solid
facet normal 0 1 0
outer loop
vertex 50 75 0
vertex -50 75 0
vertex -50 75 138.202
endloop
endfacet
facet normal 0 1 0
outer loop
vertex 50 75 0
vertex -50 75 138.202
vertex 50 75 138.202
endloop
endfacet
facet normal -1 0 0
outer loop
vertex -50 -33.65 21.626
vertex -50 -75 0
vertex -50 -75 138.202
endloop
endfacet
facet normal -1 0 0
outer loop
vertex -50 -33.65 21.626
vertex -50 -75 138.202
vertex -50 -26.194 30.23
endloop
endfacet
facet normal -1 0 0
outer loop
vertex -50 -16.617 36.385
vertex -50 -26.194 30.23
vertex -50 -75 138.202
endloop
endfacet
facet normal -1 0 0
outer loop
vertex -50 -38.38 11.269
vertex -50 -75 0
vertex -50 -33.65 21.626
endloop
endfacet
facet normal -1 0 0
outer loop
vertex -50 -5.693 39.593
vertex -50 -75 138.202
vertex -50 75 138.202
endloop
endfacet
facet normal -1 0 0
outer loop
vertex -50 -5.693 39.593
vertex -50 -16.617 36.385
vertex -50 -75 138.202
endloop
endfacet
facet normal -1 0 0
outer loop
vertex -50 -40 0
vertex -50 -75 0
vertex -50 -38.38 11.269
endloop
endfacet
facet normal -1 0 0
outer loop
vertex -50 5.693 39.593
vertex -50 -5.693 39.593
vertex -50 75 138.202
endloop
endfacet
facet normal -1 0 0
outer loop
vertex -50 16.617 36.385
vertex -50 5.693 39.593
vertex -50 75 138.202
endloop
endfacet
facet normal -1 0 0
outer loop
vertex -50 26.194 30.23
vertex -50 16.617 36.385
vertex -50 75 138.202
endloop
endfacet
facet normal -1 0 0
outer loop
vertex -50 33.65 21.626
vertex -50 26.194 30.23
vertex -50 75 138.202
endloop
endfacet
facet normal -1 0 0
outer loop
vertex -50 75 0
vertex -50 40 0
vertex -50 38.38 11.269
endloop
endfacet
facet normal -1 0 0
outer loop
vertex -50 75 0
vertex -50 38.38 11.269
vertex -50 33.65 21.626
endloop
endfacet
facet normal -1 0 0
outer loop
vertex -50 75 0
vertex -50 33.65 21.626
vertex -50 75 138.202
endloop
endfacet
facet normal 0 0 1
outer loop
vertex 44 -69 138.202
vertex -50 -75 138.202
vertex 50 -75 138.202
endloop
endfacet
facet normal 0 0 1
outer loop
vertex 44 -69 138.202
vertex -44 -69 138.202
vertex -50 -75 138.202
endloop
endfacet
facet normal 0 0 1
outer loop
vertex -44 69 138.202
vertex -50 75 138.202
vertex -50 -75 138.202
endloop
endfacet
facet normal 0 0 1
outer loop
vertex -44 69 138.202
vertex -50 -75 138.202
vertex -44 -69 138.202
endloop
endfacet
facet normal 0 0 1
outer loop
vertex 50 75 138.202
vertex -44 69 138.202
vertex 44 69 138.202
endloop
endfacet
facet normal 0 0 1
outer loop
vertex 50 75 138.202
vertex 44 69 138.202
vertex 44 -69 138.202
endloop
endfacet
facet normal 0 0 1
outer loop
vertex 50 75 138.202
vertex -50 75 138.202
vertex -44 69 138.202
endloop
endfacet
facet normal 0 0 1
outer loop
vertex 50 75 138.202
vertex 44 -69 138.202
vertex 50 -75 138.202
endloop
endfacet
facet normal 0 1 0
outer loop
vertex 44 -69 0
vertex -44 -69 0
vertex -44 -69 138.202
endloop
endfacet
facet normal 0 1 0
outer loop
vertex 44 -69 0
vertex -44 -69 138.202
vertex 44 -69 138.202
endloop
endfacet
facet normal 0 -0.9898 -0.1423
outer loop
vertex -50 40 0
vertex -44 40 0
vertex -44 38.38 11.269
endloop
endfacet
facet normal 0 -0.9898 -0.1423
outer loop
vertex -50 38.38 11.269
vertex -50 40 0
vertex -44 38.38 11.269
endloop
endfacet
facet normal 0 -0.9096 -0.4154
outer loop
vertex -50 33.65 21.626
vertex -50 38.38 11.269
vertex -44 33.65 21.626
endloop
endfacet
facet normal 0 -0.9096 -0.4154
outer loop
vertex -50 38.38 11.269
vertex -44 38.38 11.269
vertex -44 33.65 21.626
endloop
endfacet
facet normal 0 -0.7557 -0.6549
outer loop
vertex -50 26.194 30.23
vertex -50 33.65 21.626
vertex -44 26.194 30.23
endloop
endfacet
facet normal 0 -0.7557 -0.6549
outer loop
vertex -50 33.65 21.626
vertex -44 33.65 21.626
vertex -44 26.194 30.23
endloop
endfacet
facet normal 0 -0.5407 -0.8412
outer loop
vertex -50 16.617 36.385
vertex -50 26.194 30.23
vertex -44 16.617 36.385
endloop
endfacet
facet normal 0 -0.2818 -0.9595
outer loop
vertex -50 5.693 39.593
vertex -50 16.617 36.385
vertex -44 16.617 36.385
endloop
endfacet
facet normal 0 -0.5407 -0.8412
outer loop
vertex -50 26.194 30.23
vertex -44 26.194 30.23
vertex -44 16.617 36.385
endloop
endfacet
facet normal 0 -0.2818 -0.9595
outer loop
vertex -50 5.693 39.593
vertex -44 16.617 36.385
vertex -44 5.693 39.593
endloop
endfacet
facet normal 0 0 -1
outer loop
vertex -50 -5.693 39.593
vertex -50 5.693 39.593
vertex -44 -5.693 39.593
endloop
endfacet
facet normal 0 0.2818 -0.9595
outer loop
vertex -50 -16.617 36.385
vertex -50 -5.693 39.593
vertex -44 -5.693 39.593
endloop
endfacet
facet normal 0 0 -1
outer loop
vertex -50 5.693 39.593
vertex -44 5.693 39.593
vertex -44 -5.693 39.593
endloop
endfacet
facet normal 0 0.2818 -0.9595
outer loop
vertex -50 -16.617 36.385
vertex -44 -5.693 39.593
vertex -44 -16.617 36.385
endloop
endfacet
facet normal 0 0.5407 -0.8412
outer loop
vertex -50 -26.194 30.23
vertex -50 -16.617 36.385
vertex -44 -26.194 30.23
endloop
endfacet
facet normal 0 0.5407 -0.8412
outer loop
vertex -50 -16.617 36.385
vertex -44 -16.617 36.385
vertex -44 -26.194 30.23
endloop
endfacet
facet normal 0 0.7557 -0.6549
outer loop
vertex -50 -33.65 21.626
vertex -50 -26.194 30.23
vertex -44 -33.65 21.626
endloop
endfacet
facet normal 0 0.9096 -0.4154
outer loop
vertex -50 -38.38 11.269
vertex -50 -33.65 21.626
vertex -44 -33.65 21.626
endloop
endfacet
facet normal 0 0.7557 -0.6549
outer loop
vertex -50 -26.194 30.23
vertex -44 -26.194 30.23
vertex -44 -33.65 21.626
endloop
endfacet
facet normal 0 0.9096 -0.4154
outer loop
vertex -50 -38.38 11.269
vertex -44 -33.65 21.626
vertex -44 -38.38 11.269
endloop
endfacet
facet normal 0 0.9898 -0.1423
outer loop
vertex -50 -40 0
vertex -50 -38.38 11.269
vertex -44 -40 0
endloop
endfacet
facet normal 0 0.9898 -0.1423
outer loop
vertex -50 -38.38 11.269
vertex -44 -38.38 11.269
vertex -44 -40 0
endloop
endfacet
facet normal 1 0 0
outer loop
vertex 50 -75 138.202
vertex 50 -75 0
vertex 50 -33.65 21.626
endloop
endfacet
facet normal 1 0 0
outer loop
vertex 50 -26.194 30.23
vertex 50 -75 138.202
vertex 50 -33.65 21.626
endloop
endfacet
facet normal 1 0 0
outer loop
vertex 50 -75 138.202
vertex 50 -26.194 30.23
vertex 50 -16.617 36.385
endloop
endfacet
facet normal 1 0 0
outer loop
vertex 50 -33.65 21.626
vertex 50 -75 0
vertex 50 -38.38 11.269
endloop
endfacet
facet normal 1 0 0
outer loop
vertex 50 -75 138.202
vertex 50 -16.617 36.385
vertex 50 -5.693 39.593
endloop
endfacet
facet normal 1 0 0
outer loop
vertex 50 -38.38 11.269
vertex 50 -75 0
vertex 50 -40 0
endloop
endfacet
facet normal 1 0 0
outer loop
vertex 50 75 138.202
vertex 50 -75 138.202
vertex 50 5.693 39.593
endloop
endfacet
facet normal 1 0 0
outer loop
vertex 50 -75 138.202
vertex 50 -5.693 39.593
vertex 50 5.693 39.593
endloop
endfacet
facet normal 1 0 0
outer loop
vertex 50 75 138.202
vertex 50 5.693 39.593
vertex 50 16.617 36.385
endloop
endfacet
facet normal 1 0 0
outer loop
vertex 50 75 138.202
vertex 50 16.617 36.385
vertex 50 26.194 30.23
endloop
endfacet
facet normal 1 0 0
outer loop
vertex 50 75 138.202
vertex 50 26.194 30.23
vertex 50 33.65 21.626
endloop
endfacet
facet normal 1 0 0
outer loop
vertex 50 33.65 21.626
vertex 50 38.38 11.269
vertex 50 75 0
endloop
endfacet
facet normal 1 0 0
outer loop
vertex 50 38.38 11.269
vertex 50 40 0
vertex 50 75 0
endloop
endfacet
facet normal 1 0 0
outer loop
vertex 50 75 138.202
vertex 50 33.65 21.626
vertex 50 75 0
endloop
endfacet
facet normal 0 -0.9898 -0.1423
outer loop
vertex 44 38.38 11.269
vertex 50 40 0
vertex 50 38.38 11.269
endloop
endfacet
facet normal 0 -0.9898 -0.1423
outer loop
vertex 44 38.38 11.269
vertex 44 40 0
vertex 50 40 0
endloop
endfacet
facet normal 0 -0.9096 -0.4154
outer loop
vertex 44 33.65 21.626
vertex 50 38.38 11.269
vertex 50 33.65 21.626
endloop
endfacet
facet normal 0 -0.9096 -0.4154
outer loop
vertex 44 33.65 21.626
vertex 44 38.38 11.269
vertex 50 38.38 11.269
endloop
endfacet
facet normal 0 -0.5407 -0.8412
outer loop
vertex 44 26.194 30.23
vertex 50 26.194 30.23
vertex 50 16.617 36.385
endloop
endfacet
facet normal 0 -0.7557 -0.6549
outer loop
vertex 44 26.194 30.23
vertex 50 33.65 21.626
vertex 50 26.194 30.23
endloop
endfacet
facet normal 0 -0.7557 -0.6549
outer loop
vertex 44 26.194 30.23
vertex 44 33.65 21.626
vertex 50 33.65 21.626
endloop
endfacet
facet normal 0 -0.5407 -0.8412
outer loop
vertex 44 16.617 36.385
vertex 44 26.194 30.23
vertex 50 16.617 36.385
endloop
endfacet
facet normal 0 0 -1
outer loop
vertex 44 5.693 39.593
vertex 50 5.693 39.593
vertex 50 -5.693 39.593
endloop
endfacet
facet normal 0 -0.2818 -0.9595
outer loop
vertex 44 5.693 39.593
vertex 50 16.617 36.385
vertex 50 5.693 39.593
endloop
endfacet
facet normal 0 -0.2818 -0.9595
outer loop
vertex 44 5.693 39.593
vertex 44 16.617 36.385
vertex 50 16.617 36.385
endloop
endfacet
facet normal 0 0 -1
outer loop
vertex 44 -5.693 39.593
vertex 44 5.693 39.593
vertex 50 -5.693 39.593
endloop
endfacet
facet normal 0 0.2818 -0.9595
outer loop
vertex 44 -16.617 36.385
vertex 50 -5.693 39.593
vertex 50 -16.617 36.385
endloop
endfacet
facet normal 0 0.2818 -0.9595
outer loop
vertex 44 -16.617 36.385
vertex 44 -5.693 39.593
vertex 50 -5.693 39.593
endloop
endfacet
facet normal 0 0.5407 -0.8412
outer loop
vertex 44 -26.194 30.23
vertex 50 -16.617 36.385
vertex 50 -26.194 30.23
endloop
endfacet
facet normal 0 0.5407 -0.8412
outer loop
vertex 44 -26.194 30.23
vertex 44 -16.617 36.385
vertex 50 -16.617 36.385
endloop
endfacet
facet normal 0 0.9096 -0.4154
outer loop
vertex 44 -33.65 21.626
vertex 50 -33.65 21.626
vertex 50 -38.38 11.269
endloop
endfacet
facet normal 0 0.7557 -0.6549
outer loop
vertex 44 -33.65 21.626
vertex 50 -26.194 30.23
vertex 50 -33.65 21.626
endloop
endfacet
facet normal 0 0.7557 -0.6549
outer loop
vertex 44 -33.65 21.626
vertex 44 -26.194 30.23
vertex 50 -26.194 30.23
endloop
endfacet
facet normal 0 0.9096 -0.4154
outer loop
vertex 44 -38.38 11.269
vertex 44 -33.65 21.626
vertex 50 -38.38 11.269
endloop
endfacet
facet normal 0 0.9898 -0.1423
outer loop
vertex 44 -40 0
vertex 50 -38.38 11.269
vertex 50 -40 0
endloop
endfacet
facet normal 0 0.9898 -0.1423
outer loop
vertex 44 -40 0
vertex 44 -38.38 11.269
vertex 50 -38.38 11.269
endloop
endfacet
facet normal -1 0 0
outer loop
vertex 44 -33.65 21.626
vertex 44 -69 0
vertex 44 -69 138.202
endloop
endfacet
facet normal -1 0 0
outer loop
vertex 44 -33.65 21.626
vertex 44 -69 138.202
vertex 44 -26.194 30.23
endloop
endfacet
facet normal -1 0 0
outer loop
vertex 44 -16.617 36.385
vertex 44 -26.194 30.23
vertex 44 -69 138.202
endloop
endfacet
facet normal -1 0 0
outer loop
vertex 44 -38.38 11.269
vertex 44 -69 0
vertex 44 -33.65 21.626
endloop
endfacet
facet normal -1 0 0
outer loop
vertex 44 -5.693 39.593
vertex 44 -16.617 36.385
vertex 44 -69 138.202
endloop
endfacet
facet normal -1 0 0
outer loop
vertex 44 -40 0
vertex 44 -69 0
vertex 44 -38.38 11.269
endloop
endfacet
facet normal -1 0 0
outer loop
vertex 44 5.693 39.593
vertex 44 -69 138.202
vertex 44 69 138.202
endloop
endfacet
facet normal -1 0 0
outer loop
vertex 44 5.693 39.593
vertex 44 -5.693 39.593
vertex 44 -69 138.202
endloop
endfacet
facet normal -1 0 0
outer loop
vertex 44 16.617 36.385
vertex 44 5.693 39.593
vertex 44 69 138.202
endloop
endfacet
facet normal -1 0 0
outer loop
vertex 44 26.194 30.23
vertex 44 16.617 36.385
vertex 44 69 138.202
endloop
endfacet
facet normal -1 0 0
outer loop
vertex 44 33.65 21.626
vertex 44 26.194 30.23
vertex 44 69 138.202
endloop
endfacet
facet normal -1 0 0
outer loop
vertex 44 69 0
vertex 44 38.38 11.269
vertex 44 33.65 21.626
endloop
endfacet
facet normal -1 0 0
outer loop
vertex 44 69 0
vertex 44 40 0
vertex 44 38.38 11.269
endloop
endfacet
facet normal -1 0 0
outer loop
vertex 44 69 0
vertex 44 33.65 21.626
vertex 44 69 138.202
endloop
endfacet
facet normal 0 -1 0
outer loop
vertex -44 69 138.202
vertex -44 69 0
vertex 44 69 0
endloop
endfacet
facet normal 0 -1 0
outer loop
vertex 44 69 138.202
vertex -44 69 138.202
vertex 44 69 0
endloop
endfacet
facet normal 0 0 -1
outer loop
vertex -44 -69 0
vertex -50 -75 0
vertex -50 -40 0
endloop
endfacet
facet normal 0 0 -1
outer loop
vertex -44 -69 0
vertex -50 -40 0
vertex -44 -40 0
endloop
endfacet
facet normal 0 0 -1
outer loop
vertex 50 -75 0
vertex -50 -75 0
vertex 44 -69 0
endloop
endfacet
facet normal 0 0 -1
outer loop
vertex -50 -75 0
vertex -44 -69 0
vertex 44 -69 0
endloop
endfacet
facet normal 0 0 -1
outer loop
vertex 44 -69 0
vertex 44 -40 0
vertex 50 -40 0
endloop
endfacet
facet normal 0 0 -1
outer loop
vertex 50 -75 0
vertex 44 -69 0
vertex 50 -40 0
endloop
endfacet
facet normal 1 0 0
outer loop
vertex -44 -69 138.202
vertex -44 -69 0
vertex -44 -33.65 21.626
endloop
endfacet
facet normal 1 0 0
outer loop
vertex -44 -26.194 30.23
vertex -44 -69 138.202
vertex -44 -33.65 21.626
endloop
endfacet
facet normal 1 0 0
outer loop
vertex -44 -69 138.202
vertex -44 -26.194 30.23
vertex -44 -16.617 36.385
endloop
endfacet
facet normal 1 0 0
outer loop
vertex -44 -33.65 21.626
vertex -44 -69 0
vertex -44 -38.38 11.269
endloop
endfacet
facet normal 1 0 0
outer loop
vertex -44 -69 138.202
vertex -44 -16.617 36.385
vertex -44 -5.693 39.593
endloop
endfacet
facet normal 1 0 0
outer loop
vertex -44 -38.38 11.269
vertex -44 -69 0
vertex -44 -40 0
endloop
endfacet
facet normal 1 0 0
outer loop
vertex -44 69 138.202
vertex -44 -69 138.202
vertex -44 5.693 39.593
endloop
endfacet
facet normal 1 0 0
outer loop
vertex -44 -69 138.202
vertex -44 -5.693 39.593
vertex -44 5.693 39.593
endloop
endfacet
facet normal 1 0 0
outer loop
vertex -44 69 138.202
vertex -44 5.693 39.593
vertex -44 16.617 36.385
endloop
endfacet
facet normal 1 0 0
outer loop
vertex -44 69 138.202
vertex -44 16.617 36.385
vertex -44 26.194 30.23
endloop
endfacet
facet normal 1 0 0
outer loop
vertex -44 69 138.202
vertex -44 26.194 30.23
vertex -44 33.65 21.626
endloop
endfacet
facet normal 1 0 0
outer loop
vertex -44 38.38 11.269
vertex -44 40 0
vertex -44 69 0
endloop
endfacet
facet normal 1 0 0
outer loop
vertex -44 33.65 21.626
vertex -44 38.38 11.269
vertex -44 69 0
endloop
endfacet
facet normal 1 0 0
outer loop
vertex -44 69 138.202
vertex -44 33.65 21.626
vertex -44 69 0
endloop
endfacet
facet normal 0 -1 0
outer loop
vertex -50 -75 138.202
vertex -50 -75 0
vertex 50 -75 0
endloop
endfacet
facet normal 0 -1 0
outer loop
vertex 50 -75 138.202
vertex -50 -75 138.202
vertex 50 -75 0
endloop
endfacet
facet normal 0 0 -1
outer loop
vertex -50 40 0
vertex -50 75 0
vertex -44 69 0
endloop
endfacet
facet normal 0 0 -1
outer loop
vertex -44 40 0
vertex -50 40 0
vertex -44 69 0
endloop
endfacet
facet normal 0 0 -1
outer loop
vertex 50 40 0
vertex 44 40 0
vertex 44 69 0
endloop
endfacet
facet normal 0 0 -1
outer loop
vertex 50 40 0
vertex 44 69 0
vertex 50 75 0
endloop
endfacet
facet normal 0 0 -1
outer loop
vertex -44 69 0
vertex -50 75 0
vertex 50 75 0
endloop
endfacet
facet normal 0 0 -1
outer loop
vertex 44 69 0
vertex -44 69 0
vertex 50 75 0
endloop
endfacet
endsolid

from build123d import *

# Parameters (mm, degrees)
SKETCH1_W               = 100
SKETCH1_H               = 150
SKETCH1_W_2             = 88
SKETCH1_H_2             = 138
BOSS_EXTRUDE1_DEPTH     = 138.202315188
SKETCH2_R               = 40
CUT_EXTRUDE1_DEPTH      = 51
CUT_EXTRUDE1_DEPTH_BACK = 51


with BuildPart() as part:
    # Sketch1 → Boss-Extrude1 (new body)
    with BuildSketch(Plane.XY):
        Rectangle(SKETCH1_W, SKETCH1_H)
        Rectangle(SKETCH1_W_2, SKETCH1_H_2, mode=Mode.SUBTRACT)
    extrude(amount=BOSS_EXTRUDE1_DEPTH)

    # Sketch2 → Cut-Extrude1 (cut, two sides)
    with BuildSketch(Plane(origin=(0, 0, 0), x_dir=(0, 0, -1), z_dir=(1, 0, 0))) as cut_extrude1_sk:
        Circle(SKETCH2_R)
    extrude(amount=CUT_EXTRUDE1_DEPTH, mode=Mode.SUBTRACT)
    extrude(cut_extrude1_sk.sketch, amount=-CUT_EXTRUDE1_DEPTH_BACK, mode=Mode.SUBTRACT)


solid = part.part
